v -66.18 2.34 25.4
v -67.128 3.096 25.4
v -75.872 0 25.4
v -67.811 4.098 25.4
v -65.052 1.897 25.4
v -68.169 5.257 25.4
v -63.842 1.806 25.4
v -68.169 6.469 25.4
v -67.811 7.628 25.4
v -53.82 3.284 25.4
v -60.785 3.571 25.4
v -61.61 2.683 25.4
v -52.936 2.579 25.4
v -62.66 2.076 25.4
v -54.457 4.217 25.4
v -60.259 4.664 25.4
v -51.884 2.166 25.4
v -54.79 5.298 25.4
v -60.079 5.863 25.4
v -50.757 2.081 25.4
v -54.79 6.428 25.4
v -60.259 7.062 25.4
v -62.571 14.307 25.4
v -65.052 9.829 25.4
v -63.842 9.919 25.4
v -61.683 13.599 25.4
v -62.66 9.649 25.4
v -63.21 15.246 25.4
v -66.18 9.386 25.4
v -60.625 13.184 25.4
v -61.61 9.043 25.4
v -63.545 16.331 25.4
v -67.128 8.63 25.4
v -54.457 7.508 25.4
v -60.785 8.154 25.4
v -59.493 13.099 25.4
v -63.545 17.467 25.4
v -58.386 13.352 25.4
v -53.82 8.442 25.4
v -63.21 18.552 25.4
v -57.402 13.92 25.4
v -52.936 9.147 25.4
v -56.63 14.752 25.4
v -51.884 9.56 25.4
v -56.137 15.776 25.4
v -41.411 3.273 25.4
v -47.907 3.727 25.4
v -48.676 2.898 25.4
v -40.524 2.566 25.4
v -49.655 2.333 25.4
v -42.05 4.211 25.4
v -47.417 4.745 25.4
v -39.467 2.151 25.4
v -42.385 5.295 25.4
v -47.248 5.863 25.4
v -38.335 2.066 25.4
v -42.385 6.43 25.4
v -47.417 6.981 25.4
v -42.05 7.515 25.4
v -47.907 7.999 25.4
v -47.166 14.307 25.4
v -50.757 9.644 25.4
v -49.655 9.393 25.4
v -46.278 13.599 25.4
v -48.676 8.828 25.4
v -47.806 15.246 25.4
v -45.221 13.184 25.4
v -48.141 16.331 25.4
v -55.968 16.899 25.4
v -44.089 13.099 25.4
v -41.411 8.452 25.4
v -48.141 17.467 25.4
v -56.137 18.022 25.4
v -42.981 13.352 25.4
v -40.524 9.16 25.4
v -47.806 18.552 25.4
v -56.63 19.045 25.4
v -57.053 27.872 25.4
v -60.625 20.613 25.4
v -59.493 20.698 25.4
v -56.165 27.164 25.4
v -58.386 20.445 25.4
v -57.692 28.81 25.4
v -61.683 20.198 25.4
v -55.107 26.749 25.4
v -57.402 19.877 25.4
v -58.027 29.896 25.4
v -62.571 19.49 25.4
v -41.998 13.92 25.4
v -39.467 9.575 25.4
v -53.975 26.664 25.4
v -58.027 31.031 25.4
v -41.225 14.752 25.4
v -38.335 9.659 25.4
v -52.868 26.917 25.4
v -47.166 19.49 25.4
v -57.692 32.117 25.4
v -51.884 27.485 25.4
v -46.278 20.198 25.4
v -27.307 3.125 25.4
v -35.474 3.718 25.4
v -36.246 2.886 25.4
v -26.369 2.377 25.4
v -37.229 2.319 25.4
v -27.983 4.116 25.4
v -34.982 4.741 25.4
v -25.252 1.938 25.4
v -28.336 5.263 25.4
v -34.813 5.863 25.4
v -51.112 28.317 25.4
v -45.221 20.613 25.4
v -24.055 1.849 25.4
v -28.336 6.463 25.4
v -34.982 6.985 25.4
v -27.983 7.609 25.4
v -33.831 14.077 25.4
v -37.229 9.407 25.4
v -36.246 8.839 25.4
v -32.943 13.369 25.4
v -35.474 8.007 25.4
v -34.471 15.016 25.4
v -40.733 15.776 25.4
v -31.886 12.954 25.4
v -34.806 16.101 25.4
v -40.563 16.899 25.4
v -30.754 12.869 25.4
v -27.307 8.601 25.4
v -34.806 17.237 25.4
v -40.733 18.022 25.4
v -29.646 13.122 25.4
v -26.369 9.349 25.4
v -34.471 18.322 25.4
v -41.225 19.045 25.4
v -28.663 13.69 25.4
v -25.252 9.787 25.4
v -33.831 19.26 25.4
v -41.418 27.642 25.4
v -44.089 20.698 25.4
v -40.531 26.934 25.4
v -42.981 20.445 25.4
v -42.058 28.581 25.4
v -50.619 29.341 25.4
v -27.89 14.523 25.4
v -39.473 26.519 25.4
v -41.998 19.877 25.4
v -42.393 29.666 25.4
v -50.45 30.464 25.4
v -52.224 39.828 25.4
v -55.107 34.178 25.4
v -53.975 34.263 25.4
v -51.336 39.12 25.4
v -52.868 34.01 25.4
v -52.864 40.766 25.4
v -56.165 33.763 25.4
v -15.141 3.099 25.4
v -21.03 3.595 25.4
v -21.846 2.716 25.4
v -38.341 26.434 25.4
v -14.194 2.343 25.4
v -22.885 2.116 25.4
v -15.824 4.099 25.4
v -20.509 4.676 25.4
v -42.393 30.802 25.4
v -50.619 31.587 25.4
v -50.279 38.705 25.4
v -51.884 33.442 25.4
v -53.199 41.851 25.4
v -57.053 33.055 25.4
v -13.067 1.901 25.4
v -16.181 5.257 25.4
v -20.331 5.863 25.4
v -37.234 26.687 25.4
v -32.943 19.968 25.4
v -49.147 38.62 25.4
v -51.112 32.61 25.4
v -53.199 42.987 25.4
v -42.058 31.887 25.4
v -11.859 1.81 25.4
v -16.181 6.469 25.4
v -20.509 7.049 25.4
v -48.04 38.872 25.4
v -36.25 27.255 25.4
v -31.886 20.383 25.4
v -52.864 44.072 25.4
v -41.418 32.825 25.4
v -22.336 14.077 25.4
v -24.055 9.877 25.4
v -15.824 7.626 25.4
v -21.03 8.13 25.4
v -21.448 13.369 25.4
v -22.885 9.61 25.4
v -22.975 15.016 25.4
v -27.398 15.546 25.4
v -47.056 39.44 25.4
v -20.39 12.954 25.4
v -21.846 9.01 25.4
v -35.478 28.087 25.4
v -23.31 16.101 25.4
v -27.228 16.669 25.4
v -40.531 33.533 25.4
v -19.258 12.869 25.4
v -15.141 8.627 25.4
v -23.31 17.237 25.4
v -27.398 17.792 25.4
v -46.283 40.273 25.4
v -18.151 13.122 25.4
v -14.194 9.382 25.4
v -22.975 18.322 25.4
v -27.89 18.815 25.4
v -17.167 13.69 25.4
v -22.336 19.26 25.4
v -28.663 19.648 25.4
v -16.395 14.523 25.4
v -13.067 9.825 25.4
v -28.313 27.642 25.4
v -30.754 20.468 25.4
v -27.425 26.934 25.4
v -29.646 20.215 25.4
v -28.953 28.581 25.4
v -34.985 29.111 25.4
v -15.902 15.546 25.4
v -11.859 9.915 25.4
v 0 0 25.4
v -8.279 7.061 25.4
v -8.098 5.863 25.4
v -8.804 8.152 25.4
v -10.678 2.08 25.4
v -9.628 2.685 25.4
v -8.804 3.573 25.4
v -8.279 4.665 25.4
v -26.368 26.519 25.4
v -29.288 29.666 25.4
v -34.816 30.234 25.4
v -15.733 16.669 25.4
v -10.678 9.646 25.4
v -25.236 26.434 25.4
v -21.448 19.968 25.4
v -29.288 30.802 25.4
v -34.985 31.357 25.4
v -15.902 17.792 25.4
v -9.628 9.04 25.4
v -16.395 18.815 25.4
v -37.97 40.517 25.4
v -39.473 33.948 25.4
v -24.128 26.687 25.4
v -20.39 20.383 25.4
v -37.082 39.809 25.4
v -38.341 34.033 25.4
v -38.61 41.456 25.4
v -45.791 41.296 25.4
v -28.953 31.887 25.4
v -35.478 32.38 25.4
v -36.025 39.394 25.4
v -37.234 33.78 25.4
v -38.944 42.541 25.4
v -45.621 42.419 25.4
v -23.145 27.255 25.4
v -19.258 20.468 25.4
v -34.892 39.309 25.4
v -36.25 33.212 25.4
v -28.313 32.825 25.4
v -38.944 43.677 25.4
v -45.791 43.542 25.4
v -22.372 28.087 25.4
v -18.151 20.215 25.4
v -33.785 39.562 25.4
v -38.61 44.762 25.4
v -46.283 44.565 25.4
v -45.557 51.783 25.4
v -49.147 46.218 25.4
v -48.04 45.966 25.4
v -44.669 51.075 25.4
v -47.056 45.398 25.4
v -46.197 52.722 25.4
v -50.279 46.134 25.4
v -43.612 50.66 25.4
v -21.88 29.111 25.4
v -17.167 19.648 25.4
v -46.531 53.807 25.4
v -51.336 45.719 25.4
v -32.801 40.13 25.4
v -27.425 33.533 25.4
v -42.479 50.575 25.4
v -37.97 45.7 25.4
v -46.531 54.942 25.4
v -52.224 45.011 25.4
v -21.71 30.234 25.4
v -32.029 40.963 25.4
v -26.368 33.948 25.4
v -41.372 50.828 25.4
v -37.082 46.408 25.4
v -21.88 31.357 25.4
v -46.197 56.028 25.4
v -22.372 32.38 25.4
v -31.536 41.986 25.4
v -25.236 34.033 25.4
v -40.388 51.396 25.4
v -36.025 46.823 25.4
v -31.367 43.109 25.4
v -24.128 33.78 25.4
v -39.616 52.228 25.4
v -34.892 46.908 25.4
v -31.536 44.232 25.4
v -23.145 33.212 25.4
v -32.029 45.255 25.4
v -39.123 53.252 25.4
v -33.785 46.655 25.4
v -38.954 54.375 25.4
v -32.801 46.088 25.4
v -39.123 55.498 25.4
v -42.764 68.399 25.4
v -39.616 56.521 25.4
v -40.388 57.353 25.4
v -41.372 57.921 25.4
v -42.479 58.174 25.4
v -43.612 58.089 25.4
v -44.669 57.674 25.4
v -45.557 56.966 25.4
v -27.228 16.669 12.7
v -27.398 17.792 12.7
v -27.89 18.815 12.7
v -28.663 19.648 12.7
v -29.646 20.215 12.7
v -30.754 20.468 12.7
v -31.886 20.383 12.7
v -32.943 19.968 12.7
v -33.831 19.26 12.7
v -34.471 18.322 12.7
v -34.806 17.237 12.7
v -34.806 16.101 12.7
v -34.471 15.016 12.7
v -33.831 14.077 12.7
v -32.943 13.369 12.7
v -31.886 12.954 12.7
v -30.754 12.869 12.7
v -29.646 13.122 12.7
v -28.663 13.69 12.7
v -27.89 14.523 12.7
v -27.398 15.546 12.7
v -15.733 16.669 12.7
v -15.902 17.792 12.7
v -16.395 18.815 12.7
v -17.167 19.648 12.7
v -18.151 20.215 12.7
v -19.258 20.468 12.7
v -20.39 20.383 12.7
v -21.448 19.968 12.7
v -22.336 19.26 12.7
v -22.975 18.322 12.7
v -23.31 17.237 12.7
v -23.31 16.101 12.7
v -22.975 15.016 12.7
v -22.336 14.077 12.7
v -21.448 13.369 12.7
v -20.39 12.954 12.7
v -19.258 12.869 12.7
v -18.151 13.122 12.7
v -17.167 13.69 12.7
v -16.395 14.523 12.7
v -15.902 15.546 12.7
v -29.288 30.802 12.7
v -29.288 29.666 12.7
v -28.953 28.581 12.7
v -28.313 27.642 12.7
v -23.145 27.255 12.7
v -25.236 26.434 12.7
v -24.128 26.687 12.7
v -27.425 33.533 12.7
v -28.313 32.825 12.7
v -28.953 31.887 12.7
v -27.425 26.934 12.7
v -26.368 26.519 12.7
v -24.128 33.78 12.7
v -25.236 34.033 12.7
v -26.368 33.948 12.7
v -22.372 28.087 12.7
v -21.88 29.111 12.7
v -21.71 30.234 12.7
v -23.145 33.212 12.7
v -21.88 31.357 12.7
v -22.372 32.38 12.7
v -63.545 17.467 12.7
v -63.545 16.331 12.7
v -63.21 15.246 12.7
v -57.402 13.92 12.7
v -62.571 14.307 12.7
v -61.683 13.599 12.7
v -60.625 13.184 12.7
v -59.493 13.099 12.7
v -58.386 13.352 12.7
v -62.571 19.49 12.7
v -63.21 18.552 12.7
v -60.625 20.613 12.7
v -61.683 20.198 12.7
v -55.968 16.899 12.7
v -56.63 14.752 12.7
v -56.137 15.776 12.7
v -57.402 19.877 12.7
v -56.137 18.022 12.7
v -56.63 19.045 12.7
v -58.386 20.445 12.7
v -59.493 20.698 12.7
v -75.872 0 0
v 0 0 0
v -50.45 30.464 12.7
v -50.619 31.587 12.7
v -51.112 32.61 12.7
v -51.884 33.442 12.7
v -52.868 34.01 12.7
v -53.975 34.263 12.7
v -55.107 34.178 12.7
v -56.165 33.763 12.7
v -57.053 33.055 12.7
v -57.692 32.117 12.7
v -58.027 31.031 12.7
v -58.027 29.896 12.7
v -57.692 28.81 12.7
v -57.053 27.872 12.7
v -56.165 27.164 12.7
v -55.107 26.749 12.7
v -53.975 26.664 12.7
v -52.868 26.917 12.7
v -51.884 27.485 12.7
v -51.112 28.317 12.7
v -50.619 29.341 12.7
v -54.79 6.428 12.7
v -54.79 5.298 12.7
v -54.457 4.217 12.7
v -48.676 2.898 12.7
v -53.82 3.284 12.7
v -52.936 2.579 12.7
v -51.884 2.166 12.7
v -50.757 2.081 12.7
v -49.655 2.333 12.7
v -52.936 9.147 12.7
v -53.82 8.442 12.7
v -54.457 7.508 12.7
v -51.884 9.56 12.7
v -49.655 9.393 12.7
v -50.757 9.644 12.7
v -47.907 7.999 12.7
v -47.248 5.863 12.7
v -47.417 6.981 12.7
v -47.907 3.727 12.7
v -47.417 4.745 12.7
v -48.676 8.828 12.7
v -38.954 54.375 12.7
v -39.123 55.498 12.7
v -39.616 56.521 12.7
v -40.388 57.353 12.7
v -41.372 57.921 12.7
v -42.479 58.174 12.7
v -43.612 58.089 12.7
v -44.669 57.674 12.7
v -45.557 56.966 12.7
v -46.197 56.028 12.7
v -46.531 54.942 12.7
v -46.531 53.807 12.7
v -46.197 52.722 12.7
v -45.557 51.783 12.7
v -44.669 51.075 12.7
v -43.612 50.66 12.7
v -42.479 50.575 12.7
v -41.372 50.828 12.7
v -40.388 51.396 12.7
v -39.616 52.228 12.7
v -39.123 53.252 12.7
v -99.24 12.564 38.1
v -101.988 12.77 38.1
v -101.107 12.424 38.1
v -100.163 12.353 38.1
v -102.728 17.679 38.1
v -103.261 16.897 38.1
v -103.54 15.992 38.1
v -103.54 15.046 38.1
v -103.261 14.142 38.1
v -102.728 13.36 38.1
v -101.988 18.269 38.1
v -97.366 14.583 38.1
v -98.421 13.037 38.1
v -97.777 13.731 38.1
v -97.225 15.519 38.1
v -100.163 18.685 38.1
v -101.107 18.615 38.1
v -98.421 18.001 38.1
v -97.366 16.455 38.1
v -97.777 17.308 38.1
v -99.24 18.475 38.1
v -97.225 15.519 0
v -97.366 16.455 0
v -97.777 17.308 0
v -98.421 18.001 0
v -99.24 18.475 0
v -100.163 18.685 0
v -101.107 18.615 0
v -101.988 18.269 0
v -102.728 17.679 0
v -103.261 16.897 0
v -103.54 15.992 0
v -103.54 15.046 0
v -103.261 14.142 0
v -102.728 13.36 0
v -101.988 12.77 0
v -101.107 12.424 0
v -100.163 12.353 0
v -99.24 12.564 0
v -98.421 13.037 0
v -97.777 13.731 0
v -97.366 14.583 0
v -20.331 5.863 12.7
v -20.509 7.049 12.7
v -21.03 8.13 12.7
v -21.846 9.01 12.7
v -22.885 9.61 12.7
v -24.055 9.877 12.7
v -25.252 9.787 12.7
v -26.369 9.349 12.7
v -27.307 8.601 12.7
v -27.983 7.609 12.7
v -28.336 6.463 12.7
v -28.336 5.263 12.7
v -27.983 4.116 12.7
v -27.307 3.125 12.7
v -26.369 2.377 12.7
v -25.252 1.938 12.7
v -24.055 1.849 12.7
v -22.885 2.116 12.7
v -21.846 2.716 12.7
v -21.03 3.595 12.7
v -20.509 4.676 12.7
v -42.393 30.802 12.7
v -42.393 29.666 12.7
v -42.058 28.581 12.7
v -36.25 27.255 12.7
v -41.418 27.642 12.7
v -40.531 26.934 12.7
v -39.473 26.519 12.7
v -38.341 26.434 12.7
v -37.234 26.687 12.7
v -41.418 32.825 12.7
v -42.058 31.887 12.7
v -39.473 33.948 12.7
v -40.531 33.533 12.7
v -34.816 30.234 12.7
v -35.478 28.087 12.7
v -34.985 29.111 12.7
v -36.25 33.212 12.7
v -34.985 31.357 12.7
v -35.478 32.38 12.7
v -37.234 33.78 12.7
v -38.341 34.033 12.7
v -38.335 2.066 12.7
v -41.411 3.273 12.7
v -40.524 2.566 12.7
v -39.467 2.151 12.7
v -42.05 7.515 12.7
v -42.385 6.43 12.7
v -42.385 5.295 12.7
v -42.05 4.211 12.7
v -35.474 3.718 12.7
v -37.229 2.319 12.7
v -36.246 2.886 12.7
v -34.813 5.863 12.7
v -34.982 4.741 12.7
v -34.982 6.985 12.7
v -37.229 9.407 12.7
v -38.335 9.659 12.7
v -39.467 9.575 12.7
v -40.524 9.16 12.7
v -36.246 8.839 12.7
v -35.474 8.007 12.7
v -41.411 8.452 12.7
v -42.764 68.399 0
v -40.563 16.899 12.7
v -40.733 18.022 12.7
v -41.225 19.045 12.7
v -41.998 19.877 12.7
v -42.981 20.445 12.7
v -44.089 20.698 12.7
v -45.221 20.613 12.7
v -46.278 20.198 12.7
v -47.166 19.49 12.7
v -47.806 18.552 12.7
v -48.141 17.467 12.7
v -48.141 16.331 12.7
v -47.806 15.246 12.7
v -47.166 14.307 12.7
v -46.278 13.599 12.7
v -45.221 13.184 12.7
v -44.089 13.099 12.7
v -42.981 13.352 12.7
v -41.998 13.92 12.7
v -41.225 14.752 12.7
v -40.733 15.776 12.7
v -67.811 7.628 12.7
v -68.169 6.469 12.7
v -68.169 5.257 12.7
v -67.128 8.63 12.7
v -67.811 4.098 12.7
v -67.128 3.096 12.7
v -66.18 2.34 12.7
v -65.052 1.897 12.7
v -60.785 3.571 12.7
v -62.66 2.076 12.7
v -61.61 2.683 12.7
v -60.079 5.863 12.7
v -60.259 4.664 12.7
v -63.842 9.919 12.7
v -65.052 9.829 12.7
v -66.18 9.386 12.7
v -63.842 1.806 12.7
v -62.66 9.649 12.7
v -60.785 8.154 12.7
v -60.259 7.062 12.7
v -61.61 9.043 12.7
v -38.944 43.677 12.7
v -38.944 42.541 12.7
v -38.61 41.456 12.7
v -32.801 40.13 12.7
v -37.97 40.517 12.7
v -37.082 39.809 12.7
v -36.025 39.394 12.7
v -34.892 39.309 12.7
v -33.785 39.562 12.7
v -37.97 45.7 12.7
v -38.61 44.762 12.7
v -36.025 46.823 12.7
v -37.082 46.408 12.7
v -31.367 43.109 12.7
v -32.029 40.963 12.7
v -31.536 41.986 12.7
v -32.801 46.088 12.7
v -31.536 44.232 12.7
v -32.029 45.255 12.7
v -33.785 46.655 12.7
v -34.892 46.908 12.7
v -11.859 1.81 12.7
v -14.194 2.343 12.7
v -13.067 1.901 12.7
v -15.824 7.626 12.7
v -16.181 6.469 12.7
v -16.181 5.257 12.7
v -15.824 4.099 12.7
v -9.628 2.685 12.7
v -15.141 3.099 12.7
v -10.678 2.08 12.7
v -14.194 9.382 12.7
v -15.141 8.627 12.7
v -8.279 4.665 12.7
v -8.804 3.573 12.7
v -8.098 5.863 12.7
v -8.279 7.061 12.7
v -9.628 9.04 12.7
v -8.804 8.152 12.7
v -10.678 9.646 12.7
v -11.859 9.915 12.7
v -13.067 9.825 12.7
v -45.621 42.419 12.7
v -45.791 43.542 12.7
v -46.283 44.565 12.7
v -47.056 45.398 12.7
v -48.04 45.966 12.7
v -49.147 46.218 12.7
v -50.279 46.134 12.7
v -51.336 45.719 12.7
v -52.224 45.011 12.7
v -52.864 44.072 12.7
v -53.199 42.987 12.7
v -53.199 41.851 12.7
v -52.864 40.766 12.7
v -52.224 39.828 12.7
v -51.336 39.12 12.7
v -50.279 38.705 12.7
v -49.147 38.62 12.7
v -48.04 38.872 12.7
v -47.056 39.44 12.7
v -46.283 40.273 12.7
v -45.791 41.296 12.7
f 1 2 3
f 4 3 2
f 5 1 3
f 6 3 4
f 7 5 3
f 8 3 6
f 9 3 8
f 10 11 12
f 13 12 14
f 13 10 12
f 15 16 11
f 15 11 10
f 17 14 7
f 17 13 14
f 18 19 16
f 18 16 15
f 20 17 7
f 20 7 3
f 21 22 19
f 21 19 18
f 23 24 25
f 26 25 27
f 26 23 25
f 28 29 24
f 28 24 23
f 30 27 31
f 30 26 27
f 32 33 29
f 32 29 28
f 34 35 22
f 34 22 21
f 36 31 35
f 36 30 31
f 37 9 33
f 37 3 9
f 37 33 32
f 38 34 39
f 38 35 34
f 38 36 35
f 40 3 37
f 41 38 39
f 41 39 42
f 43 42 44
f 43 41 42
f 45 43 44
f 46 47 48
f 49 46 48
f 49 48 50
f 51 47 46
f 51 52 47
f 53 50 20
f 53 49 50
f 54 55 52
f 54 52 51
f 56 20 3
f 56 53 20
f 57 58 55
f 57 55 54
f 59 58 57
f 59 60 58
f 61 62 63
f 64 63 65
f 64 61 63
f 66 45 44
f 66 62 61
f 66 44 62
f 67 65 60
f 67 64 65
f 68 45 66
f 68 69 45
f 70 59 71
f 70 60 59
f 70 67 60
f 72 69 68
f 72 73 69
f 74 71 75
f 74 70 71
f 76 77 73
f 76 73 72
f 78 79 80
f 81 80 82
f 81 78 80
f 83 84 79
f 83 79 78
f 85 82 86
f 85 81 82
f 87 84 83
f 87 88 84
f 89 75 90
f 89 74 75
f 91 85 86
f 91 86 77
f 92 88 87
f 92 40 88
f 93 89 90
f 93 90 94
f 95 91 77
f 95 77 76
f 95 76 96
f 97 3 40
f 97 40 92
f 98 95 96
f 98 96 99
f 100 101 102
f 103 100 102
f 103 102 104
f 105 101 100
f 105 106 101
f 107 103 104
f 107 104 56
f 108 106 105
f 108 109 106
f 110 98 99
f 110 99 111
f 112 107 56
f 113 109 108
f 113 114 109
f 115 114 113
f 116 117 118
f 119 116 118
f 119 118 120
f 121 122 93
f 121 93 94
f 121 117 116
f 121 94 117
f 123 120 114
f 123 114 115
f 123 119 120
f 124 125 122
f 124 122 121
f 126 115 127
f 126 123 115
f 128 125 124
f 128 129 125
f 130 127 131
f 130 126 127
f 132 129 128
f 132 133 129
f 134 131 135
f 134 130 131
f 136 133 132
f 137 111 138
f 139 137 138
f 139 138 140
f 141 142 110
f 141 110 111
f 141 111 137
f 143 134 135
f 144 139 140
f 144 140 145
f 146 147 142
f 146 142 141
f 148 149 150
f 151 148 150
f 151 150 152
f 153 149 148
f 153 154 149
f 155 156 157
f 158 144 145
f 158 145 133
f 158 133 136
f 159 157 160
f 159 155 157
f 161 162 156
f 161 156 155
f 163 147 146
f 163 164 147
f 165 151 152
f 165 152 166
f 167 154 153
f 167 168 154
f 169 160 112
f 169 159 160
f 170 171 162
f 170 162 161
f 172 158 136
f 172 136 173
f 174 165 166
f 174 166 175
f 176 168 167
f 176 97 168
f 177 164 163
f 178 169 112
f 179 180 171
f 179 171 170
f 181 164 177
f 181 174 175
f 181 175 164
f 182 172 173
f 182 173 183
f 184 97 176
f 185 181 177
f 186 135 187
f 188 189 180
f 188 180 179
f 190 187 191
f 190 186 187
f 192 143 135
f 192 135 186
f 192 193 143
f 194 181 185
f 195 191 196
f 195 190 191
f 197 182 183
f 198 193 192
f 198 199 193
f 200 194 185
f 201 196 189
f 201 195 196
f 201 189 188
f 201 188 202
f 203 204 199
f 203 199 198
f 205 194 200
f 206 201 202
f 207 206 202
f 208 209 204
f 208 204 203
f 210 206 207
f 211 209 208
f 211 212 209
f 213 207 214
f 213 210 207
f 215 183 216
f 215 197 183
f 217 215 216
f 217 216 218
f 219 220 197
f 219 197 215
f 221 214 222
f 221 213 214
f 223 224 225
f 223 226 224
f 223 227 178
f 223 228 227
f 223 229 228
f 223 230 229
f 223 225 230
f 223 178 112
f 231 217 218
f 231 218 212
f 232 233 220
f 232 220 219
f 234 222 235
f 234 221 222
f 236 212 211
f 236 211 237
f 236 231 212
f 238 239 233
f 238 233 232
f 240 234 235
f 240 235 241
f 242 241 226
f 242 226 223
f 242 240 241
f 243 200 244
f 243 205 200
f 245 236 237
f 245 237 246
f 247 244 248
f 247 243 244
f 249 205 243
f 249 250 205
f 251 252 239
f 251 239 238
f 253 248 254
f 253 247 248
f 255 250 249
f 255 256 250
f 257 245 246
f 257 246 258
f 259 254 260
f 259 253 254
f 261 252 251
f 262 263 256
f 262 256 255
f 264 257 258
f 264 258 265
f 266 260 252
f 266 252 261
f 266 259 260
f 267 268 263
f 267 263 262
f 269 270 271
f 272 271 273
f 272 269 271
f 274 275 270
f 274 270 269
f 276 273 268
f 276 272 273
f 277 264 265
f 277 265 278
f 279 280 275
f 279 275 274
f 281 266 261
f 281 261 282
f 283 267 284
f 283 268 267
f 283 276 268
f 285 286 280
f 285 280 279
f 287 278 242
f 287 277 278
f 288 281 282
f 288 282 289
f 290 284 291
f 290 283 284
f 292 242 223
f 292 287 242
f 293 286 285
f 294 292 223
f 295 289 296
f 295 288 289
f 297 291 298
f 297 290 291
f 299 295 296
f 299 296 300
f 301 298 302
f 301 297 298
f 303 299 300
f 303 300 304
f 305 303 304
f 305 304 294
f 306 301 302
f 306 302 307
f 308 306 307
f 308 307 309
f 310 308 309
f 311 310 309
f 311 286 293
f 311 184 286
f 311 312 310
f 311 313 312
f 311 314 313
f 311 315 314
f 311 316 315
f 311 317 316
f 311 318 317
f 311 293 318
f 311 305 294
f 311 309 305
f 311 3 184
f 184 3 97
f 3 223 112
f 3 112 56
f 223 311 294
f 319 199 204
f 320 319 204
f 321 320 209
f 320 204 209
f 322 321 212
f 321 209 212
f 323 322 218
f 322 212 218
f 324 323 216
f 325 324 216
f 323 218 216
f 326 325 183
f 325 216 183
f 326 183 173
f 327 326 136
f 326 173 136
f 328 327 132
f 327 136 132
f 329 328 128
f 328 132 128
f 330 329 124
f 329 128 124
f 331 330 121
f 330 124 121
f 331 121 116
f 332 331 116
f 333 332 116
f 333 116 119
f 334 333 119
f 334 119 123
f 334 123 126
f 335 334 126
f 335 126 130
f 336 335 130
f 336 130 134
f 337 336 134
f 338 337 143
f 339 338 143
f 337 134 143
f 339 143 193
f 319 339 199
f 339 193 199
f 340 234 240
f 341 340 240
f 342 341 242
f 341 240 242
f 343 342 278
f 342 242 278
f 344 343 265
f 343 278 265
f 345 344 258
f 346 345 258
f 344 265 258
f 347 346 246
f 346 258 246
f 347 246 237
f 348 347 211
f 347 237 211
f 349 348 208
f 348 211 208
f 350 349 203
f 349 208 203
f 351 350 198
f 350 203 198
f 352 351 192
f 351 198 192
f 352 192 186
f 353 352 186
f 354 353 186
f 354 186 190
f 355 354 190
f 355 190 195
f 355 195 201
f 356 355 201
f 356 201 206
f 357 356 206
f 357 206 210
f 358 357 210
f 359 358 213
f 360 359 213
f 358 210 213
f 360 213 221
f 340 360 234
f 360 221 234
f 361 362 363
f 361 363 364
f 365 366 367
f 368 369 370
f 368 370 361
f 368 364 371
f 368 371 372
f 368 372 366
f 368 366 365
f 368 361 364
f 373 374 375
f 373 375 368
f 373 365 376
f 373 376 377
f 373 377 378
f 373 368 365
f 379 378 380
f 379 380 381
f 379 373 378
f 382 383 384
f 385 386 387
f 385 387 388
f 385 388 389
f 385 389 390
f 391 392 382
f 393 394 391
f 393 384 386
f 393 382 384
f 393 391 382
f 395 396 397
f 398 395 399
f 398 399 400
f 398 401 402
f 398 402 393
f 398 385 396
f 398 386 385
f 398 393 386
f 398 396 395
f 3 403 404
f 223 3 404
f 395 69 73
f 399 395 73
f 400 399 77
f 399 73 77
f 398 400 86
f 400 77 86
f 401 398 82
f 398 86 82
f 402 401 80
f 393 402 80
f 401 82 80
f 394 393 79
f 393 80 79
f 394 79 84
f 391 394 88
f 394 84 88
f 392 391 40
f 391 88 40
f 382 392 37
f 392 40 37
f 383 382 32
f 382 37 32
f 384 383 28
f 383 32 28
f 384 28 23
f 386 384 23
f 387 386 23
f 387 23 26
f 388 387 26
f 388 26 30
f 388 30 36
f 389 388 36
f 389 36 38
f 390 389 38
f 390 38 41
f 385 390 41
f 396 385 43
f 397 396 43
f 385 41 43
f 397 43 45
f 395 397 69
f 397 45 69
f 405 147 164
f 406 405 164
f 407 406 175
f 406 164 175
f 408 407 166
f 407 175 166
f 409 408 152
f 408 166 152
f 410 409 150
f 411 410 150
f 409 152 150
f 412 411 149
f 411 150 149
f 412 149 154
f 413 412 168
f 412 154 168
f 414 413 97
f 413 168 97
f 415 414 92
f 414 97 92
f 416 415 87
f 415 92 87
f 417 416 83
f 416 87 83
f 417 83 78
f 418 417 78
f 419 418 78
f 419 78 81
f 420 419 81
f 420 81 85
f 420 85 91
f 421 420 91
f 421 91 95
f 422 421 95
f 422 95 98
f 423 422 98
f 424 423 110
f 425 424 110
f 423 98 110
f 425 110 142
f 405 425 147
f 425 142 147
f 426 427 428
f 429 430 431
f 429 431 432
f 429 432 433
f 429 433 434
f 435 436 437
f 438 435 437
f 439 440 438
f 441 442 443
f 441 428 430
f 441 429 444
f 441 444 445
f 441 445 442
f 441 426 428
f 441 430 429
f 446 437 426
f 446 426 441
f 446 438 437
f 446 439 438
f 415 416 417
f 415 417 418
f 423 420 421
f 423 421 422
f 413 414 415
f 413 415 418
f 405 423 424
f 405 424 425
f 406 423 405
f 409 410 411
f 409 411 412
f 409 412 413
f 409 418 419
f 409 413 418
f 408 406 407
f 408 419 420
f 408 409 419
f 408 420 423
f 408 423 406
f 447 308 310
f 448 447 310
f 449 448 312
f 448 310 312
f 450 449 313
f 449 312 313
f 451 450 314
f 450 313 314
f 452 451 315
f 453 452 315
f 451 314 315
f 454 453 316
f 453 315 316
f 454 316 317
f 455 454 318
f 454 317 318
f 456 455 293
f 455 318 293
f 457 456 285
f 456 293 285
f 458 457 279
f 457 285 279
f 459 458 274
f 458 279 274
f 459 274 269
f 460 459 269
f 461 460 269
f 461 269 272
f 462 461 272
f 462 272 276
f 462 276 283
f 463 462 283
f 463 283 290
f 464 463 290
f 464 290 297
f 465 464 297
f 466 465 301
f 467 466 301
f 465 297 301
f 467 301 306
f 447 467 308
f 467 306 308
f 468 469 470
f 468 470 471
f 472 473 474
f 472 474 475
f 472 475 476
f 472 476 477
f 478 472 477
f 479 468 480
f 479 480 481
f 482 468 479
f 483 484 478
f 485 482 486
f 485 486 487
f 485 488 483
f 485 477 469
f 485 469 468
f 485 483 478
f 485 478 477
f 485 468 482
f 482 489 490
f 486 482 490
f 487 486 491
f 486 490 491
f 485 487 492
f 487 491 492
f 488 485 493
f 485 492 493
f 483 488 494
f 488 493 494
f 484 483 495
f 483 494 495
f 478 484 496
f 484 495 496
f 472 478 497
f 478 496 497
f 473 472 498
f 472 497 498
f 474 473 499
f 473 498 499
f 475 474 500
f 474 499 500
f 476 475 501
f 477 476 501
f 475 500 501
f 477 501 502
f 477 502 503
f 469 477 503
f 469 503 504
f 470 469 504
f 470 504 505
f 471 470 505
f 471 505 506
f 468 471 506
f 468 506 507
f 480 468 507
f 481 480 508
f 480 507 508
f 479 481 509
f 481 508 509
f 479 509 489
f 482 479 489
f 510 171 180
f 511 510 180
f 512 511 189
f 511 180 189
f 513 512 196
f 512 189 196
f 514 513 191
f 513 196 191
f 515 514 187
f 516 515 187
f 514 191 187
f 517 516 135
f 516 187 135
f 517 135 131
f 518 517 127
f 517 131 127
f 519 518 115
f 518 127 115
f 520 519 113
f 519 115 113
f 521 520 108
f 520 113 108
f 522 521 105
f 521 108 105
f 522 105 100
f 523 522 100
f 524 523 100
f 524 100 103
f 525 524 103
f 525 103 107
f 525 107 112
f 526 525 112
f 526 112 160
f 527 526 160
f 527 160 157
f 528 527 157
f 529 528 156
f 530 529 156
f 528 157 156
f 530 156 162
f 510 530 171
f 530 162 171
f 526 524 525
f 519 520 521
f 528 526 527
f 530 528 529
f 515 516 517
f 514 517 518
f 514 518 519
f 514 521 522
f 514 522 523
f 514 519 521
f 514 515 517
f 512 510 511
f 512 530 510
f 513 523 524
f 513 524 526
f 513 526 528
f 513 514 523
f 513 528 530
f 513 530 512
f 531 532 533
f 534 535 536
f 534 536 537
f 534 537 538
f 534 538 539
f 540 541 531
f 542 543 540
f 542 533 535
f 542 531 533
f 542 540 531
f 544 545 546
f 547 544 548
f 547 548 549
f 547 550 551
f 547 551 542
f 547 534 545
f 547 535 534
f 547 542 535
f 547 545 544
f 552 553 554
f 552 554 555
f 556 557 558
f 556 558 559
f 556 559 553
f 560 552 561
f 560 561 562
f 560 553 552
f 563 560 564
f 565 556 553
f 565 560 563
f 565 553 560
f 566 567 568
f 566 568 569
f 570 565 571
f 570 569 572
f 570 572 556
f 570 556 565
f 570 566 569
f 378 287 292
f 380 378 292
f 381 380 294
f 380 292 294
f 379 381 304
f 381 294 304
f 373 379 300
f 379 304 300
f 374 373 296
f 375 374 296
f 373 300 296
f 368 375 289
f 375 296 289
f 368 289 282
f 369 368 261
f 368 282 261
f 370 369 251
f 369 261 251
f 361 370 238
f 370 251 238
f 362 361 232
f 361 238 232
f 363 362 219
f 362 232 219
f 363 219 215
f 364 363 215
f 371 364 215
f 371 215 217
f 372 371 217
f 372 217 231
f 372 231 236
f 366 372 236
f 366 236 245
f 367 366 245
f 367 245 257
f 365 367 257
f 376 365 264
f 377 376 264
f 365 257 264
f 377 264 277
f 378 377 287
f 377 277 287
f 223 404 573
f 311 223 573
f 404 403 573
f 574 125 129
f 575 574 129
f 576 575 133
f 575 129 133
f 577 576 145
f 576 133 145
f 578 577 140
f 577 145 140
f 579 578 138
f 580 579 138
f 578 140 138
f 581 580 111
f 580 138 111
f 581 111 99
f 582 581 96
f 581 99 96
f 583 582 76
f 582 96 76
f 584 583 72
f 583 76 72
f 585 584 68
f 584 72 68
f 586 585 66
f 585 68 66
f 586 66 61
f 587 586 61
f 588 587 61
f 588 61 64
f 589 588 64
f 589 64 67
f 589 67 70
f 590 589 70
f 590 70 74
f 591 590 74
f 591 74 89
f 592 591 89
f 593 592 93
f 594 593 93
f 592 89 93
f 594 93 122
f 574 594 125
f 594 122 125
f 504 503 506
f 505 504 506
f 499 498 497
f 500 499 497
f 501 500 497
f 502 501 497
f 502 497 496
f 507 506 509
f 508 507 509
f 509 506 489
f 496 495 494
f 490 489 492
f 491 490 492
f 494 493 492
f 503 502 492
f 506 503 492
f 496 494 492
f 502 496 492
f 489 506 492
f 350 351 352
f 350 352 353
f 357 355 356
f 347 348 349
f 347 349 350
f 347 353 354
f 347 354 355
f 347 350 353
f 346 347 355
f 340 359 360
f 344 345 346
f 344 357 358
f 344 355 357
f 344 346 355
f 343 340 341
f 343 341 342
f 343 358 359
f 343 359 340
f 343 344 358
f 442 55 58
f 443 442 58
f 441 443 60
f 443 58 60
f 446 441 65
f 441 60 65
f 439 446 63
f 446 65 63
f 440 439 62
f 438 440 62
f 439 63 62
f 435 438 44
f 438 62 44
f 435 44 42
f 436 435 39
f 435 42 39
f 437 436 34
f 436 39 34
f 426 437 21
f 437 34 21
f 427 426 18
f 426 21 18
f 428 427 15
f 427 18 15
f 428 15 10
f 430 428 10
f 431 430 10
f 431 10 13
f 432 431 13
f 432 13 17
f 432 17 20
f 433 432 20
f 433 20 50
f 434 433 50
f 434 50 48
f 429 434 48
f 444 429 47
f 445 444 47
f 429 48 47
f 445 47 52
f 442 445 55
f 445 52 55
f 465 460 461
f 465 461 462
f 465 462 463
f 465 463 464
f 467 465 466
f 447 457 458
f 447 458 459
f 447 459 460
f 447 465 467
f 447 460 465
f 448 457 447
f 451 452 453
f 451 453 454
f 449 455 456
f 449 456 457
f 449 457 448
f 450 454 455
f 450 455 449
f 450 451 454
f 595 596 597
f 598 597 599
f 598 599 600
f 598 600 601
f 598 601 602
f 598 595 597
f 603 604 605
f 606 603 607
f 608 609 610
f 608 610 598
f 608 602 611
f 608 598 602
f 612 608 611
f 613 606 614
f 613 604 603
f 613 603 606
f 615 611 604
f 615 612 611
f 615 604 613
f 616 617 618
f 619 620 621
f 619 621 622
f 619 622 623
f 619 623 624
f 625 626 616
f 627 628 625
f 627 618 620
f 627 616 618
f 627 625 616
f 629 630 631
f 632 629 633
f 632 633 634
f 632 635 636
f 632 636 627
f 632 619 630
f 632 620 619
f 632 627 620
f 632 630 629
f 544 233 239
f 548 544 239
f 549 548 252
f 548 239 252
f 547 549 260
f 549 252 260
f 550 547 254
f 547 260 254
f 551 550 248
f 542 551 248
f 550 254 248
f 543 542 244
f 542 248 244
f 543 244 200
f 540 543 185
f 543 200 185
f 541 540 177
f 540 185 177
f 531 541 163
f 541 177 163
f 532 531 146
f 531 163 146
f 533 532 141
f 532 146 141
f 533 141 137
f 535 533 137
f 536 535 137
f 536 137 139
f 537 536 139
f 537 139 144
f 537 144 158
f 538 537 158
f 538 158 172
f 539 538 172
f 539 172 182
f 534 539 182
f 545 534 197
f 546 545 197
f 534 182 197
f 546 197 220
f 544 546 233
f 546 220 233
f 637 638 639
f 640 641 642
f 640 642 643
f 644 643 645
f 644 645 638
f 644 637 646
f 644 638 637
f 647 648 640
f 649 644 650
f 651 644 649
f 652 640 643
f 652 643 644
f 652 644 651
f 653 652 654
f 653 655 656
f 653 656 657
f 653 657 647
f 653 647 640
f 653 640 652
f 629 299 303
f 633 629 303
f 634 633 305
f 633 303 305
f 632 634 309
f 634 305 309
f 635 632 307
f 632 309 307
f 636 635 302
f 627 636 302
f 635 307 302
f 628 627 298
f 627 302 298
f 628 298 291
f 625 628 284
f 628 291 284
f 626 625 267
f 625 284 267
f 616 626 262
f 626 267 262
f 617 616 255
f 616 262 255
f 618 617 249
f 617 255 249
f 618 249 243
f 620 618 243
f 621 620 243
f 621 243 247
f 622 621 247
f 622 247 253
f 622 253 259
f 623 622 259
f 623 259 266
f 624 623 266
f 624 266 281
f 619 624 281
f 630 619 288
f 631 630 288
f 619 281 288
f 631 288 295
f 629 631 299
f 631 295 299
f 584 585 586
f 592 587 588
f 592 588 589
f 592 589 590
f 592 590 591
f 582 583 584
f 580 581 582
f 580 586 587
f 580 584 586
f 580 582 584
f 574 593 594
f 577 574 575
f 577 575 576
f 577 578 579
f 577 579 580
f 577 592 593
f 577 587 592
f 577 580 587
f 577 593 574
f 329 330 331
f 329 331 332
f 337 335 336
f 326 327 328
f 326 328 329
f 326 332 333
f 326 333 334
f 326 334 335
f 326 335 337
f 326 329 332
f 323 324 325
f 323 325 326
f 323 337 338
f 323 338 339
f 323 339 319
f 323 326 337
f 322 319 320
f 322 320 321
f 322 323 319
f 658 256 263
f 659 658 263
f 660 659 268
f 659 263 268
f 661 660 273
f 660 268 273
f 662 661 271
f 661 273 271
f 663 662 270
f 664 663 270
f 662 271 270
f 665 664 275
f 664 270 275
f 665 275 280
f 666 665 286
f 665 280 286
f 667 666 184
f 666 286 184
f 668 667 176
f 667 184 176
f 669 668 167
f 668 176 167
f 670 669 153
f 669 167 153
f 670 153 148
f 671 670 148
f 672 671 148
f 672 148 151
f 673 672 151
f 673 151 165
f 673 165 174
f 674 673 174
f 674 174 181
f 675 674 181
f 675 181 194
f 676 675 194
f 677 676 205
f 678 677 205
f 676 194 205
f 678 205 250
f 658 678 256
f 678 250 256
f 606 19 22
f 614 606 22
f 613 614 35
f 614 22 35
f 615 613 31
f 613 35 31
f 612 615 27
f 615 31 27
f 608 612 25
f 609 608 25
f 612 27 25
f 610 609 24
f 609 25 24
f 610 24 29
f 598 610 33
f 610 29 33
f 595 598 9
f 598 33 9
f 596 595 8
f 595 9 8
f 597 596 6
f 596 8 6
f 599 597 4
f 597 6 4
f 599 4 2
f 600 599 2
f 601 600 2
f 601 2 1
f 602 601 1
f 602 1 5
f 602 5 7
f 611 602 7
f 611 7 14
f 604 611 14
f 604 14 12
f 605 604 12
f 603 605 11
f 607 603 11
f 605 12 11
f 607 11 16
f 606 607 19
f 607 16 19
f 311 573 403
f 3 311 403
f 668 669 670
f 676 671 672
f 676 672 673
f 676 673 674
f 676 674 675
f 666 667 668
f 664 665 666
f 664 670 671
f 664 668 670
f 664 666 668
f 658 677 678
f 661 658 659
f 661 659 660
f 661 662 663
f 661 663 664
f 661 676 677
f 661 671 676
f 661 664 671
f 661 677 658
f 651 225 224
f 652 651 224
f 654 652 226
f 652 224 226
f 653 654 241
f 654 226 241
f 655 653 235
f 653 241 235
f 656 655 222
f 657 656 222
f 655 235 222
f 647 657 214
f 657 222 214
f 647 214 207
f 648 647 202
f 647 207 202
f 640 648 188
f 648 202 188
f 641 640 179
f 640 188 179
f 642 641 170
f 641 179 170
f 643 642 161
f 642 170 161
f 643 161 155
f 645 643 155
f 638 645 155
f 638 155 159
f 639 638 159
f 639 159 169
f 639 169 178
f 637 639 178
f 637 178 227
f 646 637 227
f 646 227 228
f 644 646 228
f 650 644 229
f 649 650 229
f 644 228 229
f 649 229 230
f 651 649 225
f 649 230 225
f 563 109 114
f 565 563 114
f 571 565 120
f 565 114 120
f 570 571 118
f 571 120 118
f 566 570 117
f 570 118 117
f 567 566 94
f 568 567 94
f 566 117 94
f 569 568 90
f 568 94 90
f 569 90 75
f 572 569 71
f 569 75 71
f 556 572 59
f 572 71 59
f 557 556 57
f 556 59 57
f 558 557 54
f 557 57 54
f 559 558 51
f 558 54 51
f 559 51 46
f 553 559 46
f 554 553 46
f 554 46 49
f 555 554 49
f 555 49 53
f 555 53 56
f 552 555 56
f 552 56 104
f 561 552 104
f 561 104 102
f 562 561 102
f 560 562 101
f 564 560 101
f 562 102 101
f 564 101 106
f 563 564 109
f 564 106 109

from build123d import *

# Parameters (mm, degrees)
F1_DEPTH = 25.4
F2_R     = 4.067754
F2_R_2   = 3.792102
F2_R_3   = 3.807218
F2_R_4   = 4.025363
F2_R_5   = 4.064
F3_DEPTH = 12.7
F4_R     = 3.81
F5_DEPTH = 12.7
F6_R     = 3.81
F7_DEPTH = 12.7
F8_R     = 3.175
F9_DEPTH = 38.1


with BuildPart() as f1:
    # F0 (on Top) → F1 (new body)
    with BuildSketch(Plane.XY):
        Polygon((-42.763967, 68.399355), (-75.87155, 0), (0, 0), align=None)
    extrude(amount=F1_DEPTH)

    # F2 (on face) → F3 (cut)
    with BuildSketch(Plane.XY.offset(25.4)):
        with Locations((-64.146399, 5.862802)):
            Circle(F2_R)
        with Locations((-51.040348, 5.862802)):
            Circle(F2_R_2)
        with Locations((-38.619891, 5.862802)):
            Circle(F2_R_3)
        with Locations((-24.35587, 5.862802)):
            Circle(F2_R_4)
        with Locations((-12.162311, 5.862802)):
            Circle(F2_R_5)
    extrude(amount=-F3_DEPTH, mode=Mode.SUBTRACT)

    # F4 (on face) → F5 (cut)
    with BuildSketch(Plane.XY.offset(25.4)):
        with Locations((-59.777588, 16.898664)):
            Circle(F4_R)
        with Locations((-44.373363, 16.898664)):
            Circle(F4_R)
        with Locations((-31.038363, 16.66875)):
            Circle(F4_R)
        with Locations((-19.542674, 16.66875)):
            Circle(F4_R)
    extrude(amount=-F5_DEPTH, mode=Mode.SUBTRACT)

    # F6 (on face) → F7 (cut)
    with BuildSketch(Plane.XY.offset(25.4)):
        with Locations((-54.259654, 30.463578)):
            Circle(F6_R)
        with Locations((-38.625516, 30.233664)):
            Circle(F6_R)
        with Locations((-25.520431, 30.233664)):
            Circle(F6_R)
        with Locations((-49.431466, 42.419095)):
            Circle(F6_R)
        with Locations((-35.17681, 43.108836)):
            Circle(F6_R)
        with Locations((-42.763967, 54.374609)):
            Circle(F6_R)
    extrude(amount=-F7_DEPTH, mode=Mode.SUBTRACT)


with BuildPart() as f9:
    # F8 (on Top) → F9 (new body)
    with BuildSketch(Plane.XY):
        with Locations((-100.400403, 15.519182)):
            Circle(F8_R)
    extrude(amount=F9_DEPTH)


solid = Compound([f1.part, f9.part])
